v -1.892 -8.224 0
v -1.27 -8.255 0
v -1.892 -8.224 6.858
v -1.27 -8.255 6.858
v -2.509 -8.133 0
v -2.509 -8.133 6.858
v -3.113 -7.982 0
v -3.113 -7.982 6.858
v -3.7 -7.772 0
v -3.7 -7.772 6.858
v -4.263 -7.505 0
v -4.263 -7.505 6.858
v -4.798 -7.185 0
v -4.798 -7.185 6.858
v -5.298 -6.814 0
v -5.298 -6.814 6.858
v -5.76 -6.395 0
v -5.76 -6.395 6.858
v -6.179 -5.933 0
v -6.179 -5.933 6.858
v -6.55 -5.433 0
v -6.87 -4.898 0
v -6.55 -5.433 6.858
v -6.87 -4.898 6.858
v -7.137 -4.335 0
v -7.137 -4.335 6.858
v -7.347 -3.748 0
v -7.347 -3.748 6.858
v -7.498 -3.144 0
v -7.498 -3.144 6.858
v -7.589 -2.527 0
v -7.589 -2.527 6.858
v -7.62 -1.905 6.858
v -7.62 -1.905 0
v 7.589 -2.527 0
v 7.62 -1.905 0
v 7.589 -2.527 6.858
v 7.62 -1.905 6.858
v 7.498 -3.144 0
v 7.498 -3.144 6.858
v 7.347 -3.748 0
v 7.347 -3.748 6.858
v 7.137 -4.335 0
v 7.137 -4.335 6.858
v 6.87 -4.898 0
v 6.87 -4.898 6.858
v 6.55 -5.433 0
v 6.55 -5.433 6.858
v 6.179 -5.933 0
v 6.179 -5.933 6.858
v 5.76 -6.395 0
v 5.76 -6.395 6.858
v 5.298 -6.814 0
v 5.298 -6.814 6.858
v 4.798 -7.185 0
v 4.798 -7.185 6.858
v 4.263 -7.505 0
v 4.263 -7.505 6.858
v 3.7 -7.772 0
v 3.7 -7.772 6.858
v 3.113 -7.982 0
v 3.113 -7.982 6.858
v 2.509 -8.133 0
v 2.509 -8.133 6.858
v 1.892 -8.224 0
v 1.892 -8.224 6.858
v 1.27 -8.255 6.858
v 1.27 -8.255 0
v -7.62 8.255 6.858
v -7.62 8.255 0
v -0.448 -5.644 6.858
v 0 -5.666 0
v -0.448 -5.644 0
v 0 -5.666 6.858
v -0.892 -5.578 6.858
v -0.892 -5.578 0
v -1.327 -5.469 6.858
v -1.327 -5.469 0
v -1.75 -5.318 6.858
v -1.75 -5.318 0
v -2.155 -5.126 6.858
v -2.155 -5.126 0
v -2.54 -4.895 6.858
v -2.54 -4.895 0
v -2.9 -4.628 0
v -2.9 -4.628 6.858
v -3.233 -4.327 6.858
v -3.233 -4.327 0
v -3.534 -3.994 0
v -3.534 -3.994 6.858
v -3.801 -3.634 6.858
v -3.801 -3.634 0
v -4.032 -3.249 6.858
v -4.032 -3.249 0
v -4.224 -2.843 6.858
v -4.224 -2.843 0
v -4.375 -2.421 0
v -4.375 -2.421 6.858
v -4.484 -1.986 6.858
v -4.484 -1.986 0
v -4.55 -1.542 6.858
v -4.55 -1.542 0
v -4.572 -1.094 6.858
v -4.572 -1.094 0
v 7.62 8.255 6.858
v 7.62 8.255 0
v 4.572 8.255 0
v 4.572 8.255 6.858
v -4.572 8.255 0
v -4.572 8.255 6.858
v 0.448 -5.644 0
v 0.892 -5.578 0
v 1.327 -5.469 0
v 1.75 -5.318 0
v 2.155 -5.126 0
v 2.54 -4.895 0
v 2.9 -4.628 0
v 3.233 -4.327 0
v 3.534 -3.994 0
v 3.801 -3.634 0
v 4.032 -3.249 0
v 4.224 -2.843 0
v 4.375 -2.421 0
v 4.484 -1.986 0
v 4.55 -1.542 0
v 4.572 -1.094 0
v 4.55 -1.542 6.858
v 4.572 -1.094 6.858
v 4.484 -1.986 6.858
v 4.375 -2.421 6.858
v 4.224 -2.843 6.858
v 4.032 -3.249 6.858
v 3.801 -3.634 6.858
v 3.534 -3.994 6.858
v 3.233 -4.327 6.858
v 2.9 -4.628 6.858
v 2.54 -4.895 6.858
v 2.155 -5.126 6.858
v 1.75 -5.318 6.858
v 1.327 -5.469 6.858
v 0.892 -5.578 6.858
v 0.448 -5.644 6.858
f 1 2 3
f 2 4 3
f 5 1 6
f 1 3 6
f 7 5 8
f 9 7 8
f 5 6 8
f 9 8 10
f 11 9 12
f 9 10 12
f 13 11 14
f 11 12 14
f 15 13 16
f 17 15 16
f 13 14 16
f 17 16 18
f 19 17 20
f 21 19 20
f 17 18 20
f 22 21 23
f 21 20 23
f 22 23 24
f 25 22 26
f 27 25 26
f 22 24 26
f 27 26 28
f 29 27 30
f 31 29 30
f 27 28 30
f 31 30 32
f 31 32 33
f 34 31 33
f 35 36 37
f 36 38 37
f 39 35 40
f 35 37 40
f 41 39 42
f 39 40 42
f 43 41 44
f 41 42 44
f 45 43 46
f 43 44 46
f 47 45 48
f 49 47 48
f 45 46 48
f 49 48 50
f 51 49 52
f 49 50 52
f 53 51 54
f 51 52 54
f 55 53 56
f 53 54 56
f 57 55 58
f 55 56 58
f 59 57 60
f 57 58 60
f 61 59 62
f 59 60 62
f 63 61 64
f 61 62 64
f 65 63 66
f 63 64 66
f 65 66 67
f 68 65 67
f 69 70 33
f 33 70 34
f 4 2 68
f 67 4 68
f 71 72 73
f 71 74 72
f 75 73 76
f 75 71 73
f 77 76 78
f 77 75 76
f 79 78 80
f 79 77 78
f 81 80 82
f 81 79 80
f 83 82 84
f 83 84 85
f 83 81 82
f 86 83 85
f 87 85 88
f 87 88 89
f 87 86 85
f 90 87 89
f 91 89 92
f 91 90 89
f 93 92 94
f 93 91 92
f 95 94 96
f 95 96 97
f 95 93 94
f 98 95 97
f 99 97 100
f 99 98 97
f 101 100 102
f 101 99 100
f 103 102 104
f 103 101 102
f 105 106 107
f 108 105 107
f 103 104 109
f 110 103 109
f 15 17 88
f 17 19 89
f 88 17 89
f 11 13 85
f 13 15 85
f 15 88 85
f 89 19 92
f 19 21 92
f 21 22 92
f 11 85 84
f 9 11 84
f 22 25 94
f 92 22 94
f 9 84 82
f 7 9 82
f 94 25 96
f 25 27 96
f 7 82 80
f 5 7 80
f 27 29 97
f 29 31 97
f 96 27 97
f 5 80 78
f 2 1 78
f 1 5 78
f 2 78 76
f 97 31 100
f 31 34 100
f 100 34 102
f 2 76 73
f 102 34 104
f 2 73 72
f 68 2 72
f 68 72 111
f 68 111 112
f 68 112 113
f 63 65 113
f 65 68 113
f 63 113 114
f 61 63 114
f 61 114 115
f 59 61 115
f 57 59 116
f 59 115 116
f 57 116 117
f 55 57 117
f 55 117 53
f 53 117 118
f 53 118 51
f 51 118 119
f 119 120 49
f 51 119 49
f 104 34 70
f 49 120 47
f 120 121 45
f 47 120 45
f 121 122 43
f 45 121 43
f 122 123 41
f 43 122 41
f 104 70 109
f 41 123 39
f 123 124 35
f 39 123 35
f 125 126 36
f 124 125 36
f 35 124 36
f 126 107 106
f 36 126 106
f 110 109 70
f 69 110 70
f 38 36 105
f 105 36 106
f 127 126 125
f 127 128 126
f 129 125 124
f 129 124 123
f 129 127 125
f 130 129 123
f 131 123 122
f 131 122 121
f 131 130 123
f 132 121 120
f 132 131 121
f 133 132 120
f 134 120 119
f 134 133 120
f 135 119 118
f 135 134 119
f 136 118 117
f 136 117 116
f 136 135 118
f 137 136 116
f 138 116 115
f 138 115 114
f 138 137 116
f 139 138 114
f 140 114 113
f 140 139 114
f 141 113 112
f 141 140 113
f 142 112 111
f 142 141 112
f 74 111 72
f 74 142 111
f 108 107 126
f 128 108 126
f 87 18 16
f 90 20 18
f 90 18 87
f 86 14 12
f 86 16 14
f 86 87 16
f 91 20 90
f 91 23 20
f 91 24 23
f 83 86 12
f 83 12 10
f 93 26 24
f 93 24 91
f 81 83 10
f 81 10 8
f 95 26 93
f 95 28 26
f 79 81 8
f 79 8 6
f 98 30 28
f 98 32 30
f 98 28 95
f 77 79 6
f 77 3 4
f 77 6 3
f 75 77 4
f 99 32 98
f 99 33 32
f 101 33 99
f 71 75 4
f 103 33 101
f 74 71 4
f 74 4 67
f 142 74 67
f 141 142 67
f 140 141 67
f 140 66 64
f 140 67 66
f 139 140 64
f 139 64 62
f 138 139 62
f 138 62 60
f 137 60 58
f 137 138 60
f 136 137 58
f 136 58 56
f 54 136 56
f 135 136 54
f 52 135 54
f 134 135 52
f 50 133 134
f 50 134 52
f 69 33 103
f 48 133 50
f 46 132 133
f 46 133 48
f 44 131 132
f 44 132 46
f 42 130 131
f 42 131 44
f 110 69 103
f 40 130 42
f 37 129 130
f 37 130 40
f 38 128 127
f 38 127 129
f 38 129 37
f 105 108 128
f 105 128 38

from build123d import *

# Parameters (mm, degrees)
F1_DEPTH = 6.858
F2_R     = 4.57199
F3_R     = 6.35


# Not quite as in the source:
# - a fillet or chamfer is up to 0.001 mm smaller than in the source, because OpenCascade refuses the exact size


with BuildPart() as f1:
    # F0 (on Top) → F1 (new body)
    with BuildSketch(Plane.XY):
        Polygon((-7.62, -8.255), (7.62, -8.255), (7.62, 8.255), (4.572, 8.255), (4.572, -5.6657525711), (-4.572, -5.6657525711), (-4.572, 8.255), (-7.62, 8.255), align=None)
    extrude(amount=F1_DEPTH)

    # F2 (radius 4.572 in the source; OpenCascade refuses exactly that, so slightly less here)
    f2_edges = [f1.edges().sort_by_distance(p)[0] for p in [
        (-4.572, -5.665753, 3.429),
        (4.572, -5.665753, 3.429),
    ]]
    fillet(f2_edges, radius=F2_R)

    # F3
    f3_edges = [f1.edges().sort_by_distance(p)[0] for p in [
        (7.62, -8.255, 3.429),
        (-7.62, -8.255, 3.429),
    ]]
    fillet(f3_edges, radius=F3_R)


solid = f1.part
